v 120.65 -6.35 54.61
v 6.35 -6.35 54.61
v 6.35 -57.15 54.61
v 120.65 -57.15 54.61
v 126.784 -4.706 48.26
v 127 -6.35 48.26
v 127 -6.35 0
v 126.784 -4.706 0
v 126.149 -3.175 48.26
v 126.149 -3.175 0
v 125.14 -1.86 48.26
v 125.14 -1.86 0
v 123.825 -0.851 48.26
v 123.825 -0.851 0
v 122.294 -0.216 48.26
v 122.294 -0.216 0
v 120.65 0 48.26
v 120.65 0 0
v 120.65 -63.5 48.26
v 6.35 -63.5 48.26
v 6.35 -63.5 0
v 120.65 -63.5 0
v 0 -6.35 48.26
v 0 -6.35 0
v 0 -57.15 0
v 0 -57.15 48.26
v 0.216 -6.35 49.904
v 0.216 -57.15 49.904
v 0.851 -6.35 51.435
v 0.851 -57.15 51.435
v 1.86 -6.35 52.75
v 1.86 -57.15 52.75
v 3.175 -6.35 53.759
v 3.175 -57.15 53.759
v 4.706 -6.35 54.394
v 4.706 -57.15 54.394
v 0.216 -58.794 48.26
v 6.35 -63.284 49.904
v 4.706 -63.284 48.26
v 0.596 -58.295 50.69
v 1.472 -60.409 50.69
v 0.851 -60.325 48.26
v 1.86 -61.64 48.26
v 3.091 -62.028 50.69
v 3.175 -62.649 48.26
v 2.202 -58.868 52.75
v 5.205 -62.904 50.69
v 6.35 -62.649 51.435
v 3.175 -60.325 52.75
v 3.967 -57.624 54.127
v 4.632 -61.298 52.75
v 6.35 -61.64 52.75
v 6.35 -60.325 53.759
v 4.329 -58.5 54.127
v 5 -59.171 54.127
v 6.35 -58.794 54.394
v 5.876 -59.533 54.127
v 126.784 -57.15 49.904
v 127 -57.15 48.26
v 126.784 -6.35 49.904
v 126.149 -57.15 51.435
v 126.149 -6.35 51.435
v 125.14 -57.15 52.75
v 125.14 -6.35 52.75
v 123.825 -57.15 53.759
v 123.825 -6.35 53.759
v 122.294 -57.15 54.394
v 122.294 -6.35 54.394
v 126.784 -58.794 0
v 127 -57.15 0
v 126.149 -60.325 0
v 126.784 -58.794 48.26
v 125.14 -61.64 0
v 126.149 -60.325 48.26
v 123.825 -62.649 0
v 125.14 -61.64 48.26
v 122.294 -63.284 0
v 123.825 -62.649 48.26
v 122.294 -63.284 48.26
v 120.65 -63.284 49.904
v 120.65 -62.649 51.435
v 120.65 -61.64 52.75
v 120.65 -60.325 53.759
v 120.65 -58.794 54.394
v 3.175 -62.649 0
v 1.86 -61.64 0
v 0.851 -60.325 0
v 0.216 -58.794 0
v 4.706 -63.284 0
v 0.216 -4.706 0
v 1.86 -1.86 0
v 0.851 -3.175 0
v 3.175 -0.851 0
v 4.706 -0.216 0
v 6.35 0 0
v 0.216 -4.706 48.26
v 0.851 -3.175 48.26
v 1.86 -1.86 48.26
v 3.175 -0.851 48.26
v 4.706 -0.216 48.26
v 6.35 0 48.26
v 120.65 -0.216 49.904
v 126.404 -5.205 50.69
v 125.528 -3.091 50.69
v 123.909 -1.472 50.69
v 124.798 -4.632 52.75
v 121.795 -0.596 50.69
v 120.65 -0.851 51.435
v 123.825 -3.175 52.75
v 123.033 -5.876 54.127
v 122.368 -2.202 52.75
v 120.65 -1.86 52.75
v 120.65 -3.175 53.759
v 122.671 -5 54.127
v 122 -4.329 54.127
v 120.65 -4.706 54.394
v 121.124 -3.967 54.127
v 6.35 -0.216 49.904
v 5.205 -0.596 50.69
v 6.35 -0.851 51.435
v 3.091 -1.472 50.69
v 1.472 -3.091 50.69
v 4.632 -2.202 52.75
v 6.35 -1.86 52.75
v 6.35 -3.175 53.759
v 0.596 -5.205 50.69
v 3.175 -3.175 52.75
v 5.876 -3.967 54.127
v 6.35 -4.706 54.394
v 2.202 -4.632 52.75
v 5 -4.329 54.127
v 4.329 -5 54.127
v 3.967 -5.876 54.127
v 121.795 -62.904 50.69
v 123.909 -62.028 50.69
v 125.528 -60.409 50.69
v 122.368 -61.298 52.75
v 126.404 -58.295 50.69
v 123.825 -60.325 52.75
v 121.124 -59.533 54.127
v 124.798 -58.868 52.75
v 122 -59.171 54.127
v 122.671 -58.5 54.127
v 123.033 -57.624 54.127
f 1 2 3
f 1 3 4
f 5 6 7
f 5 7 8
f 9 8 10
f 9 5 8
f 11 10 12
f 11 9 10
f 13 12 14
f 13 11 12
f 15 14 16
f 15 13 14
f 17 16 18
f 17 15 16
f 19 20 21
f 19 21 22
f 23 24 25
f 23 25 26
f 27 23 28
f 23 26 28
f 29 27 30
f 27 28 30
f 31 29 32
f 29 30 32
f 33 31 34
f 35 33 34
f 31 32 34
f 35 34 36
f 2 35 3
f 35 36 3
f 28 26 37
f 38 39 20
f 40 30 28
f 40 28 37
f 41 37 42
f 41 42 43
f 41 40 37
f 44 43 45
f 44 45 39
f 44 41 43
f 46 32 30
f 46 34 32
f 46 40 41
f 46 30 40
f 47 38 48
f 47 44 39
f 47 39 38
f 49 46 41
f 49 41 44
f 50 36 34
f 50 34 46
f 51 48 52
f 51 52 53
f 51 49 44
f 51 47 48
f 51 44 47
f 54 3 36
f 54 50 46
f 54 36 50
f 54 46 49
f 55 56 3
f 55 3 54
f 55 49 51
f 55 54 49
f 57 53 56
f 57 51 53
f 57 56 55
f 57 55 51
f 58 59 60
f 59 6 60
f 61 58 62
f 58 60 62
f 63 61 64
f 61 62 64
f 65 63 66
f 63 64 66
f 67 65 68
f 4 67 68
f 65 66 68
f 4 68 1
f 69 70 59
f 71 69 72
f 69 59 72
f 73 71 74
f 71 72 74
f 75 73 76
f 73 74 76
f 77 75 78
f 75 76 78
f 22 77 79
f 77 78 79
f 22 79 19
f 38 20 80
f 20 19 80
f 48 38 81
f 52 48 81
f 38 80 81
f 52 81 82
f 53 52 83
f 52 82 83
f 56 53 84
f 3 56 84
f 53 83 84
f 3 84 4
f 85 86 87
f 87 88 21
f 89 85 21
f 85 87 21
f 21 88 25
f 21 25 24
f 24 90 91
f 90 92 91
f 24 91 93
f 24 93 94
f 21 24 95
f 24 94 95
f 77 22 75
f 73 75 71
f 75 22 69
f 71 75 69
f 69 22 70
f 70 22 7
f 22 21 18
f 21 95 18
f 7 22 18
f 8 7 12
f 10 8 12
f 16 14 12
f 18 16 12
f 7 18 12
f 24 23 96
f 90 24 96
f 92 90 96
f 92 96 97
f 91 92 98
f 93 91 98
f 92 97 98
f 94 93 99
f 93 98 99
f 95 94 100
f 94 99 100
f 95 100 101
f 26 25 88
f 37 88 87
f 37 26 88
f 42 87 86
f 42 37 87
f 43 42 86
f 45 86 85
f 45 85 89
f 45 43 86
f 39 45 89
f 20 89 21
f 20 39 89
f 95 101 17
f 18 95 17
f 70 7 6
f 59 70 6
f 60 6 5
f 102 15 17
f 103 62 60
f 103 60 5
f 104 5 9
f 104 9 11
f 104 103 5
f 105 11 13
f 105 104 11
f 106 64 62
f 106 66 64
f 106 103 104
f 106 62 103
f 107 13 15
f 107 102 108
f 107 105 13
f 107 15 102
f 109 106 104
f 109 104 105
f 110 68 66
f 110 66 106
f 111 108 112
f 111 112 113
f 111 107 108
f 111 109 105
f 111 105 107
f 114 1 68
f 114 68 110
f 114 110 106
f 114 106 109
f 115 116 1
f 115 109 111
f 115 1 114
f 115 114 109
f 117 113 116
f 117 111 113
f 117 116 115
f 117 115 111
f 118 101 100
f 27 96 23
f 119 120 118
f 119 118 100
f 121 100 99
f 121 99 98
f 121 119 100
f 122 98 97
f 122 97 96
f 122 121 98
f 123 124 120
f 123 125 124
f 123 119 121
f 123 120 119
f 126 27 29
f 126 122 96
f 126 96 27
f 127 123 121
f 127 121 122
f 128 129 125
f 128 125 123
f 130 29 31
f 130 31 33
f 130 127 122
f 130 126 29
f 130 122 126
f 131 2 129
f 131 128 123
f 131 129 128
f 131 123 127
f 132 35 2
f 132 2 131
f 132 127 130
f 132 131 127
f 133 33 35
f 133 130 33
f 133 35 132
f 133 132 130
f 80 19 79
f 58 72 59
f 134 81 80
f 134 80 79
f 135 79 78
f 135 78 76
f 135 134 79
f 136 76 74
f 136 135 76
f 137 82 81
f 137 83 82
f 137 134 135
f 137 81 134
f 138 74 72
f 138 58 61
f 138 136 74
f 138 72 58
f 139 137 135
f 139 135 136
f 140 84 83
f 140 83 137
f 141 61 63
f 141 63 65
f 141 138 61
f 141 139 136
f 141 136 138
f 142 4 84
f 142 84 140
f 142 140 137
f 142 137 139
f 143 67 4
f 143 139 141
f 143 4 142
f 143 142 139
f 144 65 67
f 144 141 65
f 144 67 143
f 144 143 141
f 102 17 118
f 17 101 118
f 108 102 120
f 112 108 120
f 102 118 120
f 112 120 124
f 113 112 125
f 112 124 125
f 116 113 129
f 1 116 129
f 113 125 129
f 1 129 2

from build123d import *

# Parameters (mm, degrees)
F0_W     = 127
F0_H     = 54.61
F1_DEPTH = 63.5
F2_R     = 6.35
F3_R     = 6.35


with BuildPart() as f1:
    # F0 (on Front) → F1 (new body)
    with BuildSketch(Plane.XZ):
        with Locations((63.5, 27.305)):
            Rectangle(F0_W, F0_H)
    extrude(amount=F1_DEPTH)

    # F2
    f2_edges = [f1.edges().sort_by_distance(p)[0] for p in [
        (127, -63.5, 27.305),
        (127, 0, 27.305),
        (0, -63.5, 27.305),
        (0, 0, 27.305),
    ]]
    fillet(f2_edges, radius=F2_R)

    # F3
    f3_edges = [f1.edges().sort_by_distance(p)[0] for p in [
        (0, -31.75, 54.61),
    ]]
    fillet(f3_edges, radius=F3_R)


solid = f1.part
